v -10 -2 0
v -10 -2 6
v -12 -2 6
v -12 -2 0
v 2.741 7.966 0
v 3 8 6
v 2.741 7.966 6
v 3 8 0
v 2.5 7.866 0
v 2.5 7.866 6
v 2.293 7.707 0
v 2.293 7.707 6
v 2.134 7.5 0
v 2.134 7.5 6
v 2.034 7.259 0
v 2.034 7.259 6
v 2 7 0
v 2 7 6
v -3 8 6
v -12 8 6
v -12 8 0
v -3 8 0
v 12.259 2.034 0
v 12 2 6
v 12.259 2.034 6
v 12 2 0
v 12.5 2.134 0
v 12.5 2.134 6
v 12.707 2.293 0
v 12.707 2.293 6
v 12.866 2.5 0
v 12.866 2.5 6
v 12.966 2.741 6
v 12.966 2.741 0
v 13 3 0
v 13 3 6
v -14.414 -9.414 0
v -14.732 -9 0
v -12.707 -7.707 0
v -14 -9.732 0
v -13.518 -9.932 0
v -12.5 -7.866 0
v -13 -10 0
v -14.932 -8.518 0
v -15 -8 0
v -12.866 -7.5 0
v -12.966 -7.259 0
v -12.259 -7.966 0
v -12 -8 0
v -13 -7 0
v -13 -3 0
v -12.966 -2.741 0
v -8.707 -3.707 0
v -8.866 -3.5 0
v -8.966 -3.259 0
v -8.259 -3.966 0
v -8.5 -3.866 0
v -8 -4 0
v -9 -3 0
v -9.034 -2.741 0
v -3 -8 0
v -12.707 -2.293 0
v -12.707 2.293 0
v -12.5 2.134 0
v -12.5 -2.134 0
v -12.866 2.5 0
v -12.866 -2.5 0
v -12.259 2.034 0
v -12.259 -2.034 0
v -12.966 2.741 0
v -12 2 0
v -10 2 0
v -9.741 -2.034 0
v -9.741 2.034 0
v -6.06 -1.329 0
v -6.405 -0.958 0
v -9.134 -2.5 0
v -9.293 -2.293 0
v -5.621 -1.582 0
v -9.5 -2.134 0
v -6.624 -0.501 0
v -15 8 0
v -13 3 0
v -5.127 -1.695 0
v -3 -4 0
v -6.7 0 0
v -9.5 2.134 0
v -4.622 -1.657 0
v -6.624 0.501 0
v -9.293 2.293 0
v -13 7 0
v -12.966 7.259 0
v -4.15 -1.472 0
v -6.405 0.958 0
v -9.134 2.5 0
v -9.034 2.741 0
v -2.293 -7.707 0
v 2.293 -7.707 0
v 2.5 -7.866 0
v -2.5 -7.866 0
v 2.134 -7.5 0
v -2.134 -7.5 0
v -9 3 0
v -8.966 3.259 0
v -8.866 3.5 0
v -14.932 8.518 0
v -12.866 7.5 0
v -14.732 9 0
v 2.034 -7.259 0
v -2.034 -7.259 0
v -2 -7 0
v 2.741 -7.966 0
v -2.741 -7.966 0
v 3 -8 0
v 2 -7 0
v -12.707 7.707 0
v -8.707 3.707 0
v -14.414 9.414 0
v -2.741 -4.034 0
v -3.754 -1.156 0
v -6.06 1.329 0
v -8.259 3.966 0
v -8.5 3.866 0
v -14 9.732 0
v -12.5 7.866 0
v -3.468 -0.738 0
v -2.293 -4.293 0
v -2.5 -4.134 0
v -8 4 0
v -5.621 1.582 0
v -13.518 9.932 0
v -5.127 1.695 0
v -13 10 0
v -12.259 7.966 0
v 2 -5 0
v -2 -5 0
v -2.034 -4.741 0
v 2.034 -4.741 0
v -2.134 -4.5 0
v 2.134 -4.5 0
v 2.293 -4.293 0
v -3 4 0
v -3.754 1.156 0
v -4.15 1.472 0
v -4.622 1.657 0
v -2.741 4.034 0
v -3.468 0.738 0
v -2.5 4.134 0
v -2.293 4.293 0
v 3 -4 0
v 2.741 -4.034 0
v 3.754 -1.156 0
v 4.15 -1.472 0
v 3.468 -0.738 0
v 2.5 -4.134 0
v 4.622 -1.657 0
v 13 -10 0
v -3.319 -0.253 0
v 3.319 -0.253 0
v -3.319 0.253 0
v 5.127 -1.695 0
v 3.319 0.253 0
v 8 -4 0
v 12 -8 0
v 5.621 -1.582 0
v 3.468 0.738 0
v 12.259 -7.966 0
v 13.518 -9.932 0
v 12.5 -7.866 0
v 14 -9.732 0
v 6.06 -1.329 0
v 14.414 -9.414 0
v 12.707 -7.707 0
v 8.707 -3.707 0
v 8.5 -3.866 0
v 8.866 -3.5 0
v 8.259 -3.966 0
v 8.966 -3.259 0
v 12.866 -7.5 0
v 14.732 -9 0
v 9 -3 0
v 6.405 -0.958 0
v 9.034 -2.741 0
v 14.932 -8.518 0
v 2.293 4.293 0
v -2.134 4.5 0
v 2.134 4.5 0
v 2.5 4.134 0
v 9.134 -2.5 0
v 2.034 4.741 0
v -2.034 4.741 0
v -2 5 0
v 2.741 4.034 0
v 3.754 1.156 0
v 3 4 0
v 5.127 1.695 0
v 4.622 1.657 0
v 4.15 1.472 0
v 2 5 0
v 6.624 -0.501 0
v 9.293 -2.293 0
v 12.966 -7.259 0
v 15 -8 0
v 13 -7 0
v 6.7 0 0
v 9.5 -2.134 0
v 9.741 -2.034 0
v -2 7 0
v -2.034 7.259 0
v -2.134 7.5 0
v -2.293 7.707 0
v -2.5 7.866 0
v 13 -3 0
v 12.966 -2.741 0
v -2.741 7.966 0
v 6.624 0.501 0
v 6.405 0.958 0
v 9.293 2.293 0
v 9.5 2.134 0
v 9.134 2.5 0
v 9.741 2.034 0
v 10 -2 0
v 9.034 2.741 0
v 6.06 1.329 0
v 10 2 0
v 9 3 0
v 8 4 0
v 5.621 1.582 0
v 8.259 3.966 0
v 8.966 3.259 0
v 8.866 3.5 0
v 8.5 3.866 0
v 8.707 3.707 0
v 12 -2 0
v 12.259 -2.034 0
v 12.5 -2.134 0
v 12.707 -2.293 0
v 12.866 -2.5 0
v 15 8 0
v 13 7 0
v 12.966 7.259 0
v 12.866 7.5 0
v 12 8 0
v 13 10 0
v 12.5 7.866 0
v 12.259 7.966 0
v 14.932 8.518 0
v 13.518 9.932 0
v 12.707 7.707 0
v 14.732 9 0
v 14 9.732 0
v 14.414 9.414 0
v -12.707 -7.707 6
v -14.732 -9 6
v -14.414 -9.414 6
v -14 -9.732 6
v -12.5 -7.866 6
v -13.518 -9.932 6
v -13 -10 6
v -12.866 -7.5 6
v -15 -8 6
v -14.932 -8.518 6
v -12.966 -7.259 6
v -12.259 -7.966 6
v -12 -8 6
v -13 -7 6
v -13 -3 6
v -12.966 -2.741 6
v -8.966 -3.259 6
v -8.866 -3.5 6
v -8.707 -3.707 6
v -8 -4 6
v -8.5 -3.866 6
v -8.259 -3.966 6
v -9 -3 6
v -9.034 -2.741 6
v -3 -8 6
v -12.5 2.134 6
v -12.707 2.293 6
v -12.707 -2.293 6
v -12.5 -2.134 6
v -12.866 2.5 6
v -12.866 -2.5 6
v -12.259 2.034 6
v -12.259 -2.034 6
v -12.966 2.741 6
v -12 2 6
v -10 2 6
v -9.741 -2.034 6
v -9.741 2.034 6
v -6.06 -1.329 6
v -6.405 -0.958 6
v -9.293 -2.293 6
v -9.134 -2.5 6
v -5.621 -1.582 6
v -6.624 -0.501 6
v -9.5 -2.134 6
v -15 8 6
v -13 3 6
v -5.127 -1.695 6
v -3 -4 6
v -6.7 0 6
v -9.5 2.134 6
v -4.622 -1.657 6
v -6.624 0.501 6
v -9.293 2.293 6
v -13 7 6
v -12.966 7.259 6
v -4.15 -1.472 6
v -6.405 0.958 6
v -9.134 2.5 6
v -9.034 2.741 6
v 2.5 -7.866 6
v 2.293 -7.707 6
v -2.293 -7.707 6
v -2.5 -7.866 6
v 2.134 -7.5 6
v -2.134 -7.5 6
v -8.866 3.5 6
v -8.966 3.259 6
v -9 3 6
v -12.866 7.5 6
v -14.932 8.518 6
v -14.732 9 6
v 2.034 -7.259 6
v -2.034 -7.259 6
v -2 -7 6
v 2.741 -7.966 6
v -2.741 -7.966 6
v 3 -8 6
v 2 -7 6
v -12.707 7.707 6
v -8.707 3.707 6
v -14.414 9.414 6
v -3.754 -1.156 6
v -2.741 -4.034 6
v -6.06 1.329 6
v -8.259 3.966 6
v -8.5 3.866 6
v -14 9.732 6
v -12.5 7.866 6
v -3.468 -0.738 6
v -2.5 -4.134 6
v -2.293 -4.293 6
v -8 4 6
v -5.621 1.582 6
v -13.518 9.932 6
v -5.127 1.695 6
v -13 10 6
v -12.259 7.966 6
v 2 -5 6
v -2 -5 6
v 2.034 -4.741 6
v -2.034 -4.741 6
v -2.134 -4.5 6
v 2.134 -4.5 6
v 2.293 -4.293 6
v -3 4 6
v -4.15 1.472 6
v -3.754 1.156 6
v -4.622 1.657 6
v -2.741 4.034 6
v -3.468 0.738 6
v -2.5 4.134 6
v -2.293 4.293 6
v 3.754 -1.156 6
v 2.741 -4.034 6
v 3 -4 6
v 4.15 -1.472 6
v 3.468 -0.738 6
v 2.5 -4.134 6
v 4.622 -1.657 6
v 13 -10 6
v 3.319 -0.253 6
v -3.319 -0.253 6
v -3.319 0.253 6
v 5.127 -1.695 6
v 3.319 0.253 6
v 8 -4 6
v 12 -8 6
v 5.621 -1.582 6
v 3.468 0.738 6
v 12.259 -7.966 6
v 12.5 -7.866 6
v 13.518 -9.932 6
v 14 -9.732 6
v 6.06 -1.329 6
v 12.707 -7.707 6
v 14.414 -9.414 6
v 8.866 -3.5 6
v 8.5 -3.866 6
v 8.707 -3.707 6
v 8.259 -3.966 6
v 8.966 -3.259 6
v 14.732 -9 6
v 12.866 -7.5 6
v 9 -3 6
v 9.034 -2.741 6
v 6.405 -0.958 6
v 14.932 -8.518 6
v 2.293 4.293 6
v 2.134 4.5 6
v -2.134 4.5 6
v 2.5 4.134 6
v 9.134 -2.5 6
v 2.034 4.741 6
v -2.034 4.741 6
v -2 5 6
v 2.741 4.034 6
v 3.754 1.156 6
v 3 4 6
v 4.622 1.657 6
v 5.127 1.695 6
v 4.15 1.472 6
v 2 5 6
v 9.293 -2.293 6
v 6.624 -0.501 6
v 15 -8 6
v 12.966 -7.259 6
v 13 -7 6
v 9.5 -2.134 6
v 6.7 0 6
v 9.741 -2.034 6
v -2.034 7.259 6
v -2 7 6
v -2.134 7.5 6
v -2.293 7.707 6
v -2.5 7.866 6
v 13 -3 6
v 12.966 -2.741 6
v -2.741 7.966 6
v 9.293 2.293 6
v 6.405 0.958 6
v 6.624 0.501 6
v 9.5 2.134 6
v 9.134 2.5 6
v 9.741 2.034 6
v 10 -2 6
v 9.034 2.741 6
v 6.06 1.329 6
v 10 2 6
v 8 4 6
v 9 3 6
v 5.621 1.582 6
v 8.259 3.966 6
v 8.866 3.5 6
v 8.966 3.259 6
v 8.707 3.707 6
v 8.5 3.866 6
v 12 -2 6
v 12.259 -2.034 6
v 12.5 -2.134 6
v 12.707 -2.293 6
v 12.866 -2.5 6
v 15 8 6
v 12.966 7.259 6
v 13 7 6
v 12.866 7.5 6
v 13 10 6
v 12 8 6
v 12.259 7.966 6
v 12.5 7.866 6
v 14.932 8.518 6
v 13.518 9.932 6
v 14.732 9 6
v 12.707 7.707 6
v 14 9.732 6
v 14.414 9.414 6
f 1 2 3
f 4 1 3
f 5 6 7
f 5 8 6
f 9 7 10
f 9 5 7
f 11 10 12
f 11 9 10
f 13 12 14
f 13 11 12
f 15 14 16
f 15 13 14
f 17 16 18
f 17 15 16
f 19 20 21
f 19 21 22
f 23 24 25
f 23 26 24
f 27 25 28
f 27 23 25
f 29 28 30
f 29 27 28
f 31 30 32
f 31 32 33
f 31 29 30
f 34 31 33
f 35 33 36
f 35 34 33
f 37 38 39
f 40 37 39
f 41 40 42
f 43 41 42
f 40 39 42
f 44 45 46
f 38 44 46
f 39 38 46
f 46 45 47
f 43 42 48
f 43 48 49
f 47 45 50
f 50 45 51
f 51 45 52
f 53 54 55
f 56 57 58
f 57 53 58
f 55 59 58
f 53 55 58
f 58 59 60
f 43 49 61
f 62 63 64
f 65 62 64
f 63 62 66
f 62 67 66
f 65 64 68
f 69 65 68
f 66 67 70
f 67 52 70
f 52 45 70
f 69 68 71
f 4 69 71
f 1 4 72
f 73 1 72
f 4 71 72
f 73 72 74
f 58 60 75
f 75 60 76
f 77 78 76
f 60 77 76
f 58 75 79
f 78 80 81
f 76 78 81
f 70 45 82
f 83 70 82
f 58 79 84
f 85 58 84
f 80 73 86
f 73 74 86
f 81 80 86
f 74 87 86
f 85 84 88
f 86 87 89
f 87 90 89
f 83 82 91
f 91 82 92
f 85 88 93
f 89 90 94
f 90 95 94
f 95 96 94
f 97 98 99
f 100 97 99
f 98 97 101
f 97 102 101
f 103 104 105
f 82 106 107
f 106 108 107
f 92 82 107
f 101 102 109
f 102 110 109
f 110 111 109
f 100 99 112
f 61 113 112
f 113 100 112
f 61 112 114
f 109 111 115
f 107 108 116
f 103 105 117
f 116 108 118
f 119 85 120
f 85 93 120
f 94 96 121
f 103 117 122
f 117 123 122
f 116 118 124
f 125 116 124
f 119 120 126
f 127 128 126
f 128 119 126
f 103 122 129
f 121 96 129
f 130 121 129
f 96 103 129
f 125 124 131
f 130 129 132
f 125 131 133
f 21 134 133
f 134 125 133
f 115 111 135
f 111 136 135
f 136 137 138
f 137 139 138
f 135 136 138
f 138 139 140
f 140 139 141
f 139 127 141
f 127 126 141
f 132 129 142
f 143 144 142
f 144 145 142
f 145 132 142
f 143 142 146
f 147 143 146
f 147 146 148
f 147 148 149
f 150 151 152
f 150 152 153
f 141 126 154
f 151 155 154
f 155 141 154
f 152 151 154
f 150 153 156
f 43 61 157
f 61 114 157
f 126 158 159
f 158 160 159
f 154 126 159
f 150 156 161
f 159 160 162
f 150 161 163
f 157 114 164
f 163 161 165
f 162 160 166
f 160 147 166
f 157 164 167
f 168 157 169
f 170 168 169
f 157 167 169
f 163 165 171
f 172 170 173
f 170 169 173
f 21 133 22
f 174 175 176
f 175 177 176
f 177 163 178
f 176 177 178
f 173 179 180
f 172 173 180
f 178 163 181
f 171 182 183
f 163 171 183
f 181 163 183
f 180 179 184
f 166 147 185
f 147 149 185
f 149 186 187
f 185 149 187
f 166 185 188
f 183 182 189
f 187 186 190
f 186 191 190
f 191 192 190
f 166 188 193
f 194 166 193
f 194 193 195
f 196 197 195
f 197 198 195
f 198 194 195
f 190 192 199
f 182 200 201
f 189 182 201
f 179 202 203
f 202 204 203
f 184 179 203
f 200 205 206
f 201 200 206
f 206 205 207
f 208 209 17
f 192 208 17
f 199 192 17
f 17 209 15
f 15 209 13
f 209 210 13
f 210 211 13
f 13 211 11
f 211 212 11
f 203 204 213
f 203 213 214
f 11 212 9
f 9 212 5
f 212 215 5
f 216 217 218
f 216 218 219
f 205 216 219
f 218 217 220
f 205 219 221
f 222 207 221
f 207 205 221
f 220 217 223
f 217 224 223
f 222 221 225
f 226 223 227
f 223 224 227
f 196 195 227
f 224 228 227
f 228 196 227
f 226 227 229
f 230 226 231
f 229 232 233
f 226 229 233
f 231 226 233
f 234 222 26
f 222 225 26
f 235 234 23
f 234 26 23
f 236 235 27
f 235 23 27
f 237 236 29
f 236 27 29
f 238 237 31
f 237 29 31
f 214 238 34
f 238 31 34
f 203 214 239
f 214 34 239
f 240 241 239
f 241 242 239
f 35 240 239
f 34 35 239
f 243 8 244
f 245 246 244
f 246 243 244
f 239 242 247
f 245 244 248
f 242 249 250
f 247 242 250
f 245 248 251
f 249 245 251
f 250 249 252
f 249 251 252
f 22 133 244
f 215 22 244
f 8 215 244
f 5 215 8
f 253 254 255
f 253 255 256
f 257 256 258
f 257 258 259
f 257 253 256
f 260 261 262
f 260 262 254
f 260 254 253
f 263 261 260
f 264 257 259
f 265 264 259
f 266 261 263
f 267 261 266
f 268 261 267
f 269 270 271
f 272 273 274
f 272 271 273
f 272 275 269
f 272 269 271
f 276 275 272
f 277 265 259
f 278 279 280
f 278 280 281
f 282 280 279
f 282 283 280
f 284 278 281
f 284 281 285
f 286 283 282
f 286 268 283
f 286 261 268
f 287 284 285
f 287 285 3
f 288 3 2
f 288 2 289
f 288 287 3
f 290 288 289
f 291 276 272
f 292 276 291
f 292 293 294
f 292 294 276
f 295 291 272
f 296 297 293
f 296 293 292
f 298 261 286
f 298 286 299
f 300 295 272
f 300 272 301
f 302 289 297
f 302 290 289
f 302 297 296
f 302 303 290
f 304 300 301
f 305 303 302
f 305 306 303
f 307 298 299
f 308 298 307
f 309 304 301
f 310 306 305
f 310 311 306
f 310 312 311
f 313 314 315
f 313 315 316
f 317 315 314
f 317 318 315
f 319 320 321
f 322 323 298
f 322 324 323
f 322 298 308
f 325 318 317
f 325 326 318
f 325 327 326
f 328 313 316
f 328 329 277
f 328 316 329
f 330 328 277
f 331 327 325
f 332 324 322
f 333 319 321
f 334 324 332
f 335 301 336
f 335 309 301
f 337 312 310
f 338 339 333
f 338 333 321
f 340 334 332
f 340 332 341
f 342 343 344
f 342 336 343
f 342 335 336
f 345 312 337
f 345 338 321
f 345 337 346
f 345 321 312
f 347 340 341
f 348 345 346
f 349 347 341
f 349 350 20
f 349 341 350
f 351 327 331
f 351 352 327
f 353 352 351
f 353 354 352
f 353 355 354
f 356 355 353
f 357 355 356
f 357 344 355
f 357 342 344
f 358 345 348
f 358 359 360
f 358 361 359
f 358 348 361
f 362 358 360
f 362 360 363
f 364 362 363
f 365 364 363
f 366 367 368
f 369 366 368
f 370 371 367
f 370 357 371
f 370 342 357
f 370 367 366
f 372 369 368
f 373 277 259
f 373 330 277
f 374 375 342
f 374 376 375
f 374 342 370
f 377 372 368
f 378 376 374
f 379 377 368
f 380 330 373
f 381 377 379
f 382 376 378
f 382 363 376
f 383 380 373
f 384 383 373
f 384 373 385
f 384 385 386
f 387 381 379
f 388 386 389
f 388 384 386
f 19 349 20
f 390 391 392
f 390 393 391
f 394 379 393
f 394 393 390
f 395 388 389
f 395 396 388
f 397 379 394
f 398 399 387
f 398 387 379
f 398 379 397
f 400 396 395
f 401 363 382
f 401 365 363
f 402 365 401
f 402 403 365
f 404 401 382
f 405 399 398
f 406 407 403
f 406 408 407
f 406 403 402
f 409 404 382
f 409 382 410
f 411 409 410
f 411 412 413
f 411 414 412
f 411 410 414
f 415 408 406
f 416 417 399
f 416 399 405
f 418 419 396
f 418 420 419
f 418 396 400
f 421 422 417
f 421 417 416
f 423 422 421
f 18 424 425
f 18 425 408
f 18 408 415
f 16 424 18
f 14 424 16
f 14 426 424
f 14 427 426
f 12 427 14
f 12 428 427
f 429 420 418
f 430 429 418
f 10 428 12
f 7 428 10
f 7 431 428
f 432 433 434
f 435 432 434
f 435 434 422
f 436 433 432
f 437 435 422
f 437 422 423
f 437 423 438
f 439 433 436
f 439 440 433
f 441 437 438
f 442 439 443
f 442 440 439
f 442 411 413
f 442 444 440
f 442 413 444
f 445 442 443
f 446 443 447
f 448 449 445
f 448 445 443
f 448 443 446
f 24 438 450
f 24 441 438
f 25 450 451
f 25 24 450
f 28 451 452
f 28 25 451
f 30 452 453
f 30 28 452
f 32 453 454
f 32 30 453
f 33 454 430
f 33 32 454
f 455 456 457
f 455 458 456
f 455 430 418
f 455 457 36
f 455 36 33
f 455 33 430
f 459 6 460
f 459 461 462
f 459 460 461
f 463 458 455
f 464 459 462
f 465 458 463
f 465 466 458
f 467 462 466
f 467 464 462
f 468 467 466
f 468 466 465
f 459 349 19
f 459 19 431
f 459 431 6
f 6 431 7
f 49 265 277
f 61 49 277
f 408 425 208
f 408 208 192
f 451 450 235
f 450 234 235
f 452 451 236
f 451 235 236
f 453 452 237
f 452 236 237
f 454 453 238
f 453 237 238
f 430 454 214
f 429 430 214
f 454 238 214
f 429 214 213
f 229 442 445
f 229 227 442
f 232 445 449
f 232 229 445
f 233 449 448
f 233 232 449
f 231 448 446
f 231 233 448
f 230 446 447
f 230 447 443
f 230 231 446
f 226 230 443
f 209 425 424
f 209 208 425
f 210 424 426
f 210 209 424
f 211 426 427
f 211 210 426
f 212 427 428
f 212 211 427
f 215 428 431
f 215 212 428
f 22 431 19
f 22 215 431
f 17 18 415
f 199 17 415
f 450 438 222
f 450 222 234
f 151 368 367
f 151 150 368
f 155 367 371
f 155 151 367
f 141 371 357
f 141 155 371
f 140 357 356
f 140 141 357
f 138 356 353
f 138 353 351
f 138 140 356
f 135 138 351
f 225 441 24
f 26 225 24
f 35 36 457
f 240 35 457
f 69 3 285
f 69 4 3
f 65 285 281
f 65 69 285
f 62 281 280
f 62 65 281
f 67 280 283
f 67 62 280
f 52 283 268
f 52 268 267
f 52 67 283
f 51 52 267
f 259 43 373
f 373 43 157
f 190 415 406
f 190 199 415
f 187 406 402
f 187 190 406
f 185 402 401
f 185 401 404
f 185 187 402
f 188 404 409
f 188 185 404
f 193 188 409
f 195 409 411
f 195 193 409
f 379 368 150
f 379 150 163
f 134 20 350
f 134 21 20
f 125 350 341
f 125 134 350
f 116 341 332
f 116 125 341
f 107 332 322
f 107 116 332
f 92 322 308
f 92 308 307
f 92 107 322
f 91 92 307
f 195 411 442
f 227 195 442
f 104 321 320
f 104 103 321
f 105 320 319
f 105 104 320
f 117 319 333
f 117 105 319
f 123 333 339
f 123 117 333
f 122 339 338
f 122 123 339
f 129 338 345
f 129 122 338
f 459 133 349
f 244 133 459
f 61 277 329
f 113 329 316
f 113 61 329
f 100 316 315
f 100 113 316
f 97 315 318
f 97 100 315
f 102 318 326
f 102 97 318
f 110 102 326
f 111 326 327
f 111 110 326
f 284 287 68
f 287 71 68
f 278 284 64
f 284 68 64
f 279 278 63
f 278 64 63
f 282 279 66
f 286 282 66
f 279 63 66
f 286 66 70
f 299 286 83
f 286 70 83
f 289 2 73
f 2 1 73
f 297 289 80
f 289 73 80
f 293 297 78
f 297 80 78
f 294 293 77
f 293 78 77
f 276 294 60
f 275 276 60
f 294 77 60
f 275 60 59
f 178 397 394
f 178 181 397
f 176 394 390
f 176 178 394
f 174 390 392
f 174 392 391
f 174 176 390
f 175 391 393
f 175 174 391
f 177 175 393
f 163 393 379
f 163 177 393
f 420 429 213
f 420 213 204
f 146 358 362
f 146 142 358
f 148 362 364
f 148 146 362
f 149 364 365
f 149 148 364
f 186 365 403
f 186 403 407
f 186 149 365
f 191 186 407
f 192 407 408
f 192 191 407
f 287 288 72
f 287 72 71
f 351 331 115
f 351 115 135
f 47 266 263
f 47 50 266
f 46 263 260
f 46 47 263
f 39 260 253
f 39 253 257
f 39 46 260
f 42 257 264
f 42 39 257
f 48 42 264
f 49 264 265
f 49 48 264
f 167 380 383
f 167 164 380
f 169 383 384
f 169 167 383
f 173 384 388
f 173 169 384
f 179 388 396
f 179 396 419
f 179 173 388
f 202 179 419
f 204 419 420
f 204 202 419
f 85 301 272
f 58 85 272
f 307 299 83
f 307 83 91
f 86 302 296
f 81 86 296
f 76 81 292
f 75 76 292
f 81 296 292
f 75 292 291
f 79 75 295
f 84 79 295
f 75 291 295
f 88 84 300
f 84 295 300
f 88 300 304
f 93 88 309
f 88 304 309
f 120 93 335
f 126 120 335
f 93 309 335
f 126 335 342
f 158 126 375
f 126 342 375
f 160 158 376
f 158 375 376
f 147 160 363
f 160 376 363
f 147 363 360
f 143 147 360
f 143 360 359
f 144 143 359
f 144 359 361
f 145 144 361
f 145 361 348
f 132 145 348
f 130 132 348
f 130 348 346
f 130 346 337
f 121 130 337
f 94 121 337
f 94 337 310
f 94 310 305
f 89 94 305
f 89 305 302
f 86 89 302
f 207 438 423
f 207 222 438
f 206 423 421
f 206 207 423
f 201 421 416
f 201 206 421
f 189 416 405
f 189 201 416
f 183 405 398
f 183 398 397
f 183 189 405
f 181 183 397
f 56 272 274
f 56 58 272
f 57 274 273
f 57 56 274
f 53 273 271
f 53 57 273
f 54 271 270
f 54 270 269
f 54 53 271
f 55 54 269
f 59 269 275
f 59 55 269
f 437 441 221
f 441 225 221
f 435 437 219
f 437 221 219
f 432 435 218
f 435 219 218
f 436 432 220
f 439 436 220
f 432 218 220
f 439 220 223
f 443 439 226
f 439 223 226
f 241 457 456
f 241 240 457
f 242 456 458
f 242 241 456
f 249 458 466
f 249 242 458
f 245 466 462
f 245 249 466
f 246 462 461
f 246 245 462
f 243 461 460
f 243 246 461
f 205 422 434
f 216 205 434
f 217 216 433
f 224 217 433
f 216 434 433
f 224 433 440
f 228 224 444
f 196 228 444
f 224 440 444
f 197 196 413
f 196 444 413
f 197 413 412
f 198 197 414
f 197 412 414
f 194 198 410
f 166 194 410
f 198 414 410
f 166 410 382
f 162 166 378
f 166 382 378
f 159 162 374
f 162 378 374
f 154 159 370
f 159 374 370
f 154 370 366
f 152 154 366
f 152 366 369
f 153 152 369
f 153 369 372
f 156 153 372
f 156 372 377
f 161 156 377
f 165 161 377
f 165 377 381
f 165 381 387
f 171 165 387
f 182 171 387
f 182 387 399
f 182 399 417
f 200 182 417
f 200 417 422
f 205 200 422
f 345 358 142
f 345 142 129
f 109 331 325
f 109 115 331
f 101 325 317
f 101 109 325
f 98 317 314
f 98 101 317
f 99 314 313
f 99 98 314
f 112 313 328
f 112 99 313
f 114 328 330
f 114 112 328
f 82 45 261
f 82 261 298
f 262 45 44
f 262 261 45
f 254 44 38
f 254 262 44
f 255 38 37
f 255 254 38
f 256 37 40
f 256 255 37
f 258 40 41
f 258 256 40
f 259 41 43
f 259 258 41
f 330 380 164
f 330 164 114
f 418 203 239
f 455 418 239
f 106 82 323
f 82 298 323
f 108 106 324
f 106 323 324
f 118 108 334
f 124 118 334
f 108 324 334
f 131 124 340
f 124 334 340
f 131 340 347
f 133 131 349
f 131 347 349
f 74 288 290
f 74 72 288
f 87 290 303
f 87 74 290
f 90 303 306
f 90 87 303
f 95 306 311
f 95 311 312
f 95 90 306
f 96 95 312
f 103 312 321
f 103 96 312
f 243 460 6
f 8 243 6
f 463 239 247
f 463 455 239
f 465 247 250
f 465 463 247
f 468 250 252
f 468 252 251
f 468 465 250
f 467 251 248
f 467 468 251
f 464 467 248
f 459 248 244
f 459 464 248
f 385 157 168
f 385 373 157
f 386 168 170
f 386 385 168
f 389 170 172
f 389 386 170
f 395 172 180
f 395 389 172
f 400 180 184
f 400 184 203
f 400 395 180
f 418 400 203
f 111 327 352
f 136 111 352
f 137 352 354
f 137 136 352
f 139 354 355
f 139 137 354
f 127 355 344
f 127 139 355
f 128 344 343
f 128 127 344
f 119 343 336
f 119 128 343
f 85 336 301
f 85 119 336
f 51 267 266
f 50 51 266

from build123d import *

# Parameters (mm, degrees)
SKETCH_1_W          = 30
SKETCH_1_H          = 20
EXTRUDE_1_DEPTH     = 6
FILLET_1_R          = 2
SKETCH_2_R          = 1.7
CUT_EXTRUDE_1_DEPTH = 20
CUT_EXTRUDE_2_DEPTH = 20
FILLET_2_R          = 1


with BuildPart() as part:
    # 草图1 → 凸台-拉伸1 (new body)
    with BuildSketch(Plane.XY):
        Rectangle(SKETCH_1_W, SKETCH_1_H)
    extrude(amount=EXTRUDE_1_DEPTH)

    # 圆角1
    fillet_1_edges = [part.edges().sort_by_distance(p)[0] for p in [
        (15, -10, 3),
        (-15, -10, 3),
        (-15, 10, 3),
        (15, 10, 3),
    ]]
    fillet(fillet_1_edges, radius=FILLET_1_R)

    # 草图2 → 切除-拉伸1 (cut, through all)
    with BuildSketch(Plane.XY.offset(6)):
        with Locations((5, 0)):
            Circle(SKETCH_2_R)
        with Locations(Location((-5, 0, 0), (0, 0, 180))):
            Circle(SKETCH_2_R)
    extrude(amount=-CUT_EXTRUDE_1_DEPTH, mode=Mode.SUBTRACT)

    # 草图3 → 切除-拉伸2 (cut, through all)
    with BuildSketch(Plane.XY.offset(6)):
        Polygon((-13, 2), (-13, 8), (-2, 8), (-2, 4), (-9, 4), (-9, 2), align=None)
        Polygon((9, 2), (13, 2), (13, 8), (2, 8), (2, 4), (9, 4), align=None)
        Polygon((13, -2), (13, -8), (2, -8), (2, -4), (9, -4), (9, -2), align=None)
        Polygon((-9, -2), (-13, -2), (-13, -8), (-2, -8), (-2, -4), (-9, -4), align=None)
    extrude(amount=-CUT_EXTRUDE_2_DEPTH, mode=Mode.SUBTRACT)

    # 圆角2
    fillet_2_edges = [part.edges().sort_by_distance(p)[0] for p in [
        (-2, -4, 3),
        (2, 8, 3),
        (13, 8, 3),
        (13, 2, 3),
        (2, 4, 3),
        (9, 2, 3),
        (9, 4, 3),
        (13, -2, 3),
        (2, -8, 3),
        (2, -4, 3),
        (9, -2, 3),
        (9, -4, 3),
        (13, -8, 3),
        (-2, -8, 3),
        (-13, -8, 3),
        (-13, -2, 3),
        (-9, -2, 3),
        (-9, -4, 3),
        (-2, 8, 3),
        (-2, 4, 3),
        (-9, 4, 3),
        (-9, 2, 3),
        (-13, 2, 3),
        (-13, 8, 3),
    ]]
    fillet(fillet_2_edges, radius=FILLET_2_R - 0.0001)  # a hair under: the kernel refuses the full size


solid = part.part
